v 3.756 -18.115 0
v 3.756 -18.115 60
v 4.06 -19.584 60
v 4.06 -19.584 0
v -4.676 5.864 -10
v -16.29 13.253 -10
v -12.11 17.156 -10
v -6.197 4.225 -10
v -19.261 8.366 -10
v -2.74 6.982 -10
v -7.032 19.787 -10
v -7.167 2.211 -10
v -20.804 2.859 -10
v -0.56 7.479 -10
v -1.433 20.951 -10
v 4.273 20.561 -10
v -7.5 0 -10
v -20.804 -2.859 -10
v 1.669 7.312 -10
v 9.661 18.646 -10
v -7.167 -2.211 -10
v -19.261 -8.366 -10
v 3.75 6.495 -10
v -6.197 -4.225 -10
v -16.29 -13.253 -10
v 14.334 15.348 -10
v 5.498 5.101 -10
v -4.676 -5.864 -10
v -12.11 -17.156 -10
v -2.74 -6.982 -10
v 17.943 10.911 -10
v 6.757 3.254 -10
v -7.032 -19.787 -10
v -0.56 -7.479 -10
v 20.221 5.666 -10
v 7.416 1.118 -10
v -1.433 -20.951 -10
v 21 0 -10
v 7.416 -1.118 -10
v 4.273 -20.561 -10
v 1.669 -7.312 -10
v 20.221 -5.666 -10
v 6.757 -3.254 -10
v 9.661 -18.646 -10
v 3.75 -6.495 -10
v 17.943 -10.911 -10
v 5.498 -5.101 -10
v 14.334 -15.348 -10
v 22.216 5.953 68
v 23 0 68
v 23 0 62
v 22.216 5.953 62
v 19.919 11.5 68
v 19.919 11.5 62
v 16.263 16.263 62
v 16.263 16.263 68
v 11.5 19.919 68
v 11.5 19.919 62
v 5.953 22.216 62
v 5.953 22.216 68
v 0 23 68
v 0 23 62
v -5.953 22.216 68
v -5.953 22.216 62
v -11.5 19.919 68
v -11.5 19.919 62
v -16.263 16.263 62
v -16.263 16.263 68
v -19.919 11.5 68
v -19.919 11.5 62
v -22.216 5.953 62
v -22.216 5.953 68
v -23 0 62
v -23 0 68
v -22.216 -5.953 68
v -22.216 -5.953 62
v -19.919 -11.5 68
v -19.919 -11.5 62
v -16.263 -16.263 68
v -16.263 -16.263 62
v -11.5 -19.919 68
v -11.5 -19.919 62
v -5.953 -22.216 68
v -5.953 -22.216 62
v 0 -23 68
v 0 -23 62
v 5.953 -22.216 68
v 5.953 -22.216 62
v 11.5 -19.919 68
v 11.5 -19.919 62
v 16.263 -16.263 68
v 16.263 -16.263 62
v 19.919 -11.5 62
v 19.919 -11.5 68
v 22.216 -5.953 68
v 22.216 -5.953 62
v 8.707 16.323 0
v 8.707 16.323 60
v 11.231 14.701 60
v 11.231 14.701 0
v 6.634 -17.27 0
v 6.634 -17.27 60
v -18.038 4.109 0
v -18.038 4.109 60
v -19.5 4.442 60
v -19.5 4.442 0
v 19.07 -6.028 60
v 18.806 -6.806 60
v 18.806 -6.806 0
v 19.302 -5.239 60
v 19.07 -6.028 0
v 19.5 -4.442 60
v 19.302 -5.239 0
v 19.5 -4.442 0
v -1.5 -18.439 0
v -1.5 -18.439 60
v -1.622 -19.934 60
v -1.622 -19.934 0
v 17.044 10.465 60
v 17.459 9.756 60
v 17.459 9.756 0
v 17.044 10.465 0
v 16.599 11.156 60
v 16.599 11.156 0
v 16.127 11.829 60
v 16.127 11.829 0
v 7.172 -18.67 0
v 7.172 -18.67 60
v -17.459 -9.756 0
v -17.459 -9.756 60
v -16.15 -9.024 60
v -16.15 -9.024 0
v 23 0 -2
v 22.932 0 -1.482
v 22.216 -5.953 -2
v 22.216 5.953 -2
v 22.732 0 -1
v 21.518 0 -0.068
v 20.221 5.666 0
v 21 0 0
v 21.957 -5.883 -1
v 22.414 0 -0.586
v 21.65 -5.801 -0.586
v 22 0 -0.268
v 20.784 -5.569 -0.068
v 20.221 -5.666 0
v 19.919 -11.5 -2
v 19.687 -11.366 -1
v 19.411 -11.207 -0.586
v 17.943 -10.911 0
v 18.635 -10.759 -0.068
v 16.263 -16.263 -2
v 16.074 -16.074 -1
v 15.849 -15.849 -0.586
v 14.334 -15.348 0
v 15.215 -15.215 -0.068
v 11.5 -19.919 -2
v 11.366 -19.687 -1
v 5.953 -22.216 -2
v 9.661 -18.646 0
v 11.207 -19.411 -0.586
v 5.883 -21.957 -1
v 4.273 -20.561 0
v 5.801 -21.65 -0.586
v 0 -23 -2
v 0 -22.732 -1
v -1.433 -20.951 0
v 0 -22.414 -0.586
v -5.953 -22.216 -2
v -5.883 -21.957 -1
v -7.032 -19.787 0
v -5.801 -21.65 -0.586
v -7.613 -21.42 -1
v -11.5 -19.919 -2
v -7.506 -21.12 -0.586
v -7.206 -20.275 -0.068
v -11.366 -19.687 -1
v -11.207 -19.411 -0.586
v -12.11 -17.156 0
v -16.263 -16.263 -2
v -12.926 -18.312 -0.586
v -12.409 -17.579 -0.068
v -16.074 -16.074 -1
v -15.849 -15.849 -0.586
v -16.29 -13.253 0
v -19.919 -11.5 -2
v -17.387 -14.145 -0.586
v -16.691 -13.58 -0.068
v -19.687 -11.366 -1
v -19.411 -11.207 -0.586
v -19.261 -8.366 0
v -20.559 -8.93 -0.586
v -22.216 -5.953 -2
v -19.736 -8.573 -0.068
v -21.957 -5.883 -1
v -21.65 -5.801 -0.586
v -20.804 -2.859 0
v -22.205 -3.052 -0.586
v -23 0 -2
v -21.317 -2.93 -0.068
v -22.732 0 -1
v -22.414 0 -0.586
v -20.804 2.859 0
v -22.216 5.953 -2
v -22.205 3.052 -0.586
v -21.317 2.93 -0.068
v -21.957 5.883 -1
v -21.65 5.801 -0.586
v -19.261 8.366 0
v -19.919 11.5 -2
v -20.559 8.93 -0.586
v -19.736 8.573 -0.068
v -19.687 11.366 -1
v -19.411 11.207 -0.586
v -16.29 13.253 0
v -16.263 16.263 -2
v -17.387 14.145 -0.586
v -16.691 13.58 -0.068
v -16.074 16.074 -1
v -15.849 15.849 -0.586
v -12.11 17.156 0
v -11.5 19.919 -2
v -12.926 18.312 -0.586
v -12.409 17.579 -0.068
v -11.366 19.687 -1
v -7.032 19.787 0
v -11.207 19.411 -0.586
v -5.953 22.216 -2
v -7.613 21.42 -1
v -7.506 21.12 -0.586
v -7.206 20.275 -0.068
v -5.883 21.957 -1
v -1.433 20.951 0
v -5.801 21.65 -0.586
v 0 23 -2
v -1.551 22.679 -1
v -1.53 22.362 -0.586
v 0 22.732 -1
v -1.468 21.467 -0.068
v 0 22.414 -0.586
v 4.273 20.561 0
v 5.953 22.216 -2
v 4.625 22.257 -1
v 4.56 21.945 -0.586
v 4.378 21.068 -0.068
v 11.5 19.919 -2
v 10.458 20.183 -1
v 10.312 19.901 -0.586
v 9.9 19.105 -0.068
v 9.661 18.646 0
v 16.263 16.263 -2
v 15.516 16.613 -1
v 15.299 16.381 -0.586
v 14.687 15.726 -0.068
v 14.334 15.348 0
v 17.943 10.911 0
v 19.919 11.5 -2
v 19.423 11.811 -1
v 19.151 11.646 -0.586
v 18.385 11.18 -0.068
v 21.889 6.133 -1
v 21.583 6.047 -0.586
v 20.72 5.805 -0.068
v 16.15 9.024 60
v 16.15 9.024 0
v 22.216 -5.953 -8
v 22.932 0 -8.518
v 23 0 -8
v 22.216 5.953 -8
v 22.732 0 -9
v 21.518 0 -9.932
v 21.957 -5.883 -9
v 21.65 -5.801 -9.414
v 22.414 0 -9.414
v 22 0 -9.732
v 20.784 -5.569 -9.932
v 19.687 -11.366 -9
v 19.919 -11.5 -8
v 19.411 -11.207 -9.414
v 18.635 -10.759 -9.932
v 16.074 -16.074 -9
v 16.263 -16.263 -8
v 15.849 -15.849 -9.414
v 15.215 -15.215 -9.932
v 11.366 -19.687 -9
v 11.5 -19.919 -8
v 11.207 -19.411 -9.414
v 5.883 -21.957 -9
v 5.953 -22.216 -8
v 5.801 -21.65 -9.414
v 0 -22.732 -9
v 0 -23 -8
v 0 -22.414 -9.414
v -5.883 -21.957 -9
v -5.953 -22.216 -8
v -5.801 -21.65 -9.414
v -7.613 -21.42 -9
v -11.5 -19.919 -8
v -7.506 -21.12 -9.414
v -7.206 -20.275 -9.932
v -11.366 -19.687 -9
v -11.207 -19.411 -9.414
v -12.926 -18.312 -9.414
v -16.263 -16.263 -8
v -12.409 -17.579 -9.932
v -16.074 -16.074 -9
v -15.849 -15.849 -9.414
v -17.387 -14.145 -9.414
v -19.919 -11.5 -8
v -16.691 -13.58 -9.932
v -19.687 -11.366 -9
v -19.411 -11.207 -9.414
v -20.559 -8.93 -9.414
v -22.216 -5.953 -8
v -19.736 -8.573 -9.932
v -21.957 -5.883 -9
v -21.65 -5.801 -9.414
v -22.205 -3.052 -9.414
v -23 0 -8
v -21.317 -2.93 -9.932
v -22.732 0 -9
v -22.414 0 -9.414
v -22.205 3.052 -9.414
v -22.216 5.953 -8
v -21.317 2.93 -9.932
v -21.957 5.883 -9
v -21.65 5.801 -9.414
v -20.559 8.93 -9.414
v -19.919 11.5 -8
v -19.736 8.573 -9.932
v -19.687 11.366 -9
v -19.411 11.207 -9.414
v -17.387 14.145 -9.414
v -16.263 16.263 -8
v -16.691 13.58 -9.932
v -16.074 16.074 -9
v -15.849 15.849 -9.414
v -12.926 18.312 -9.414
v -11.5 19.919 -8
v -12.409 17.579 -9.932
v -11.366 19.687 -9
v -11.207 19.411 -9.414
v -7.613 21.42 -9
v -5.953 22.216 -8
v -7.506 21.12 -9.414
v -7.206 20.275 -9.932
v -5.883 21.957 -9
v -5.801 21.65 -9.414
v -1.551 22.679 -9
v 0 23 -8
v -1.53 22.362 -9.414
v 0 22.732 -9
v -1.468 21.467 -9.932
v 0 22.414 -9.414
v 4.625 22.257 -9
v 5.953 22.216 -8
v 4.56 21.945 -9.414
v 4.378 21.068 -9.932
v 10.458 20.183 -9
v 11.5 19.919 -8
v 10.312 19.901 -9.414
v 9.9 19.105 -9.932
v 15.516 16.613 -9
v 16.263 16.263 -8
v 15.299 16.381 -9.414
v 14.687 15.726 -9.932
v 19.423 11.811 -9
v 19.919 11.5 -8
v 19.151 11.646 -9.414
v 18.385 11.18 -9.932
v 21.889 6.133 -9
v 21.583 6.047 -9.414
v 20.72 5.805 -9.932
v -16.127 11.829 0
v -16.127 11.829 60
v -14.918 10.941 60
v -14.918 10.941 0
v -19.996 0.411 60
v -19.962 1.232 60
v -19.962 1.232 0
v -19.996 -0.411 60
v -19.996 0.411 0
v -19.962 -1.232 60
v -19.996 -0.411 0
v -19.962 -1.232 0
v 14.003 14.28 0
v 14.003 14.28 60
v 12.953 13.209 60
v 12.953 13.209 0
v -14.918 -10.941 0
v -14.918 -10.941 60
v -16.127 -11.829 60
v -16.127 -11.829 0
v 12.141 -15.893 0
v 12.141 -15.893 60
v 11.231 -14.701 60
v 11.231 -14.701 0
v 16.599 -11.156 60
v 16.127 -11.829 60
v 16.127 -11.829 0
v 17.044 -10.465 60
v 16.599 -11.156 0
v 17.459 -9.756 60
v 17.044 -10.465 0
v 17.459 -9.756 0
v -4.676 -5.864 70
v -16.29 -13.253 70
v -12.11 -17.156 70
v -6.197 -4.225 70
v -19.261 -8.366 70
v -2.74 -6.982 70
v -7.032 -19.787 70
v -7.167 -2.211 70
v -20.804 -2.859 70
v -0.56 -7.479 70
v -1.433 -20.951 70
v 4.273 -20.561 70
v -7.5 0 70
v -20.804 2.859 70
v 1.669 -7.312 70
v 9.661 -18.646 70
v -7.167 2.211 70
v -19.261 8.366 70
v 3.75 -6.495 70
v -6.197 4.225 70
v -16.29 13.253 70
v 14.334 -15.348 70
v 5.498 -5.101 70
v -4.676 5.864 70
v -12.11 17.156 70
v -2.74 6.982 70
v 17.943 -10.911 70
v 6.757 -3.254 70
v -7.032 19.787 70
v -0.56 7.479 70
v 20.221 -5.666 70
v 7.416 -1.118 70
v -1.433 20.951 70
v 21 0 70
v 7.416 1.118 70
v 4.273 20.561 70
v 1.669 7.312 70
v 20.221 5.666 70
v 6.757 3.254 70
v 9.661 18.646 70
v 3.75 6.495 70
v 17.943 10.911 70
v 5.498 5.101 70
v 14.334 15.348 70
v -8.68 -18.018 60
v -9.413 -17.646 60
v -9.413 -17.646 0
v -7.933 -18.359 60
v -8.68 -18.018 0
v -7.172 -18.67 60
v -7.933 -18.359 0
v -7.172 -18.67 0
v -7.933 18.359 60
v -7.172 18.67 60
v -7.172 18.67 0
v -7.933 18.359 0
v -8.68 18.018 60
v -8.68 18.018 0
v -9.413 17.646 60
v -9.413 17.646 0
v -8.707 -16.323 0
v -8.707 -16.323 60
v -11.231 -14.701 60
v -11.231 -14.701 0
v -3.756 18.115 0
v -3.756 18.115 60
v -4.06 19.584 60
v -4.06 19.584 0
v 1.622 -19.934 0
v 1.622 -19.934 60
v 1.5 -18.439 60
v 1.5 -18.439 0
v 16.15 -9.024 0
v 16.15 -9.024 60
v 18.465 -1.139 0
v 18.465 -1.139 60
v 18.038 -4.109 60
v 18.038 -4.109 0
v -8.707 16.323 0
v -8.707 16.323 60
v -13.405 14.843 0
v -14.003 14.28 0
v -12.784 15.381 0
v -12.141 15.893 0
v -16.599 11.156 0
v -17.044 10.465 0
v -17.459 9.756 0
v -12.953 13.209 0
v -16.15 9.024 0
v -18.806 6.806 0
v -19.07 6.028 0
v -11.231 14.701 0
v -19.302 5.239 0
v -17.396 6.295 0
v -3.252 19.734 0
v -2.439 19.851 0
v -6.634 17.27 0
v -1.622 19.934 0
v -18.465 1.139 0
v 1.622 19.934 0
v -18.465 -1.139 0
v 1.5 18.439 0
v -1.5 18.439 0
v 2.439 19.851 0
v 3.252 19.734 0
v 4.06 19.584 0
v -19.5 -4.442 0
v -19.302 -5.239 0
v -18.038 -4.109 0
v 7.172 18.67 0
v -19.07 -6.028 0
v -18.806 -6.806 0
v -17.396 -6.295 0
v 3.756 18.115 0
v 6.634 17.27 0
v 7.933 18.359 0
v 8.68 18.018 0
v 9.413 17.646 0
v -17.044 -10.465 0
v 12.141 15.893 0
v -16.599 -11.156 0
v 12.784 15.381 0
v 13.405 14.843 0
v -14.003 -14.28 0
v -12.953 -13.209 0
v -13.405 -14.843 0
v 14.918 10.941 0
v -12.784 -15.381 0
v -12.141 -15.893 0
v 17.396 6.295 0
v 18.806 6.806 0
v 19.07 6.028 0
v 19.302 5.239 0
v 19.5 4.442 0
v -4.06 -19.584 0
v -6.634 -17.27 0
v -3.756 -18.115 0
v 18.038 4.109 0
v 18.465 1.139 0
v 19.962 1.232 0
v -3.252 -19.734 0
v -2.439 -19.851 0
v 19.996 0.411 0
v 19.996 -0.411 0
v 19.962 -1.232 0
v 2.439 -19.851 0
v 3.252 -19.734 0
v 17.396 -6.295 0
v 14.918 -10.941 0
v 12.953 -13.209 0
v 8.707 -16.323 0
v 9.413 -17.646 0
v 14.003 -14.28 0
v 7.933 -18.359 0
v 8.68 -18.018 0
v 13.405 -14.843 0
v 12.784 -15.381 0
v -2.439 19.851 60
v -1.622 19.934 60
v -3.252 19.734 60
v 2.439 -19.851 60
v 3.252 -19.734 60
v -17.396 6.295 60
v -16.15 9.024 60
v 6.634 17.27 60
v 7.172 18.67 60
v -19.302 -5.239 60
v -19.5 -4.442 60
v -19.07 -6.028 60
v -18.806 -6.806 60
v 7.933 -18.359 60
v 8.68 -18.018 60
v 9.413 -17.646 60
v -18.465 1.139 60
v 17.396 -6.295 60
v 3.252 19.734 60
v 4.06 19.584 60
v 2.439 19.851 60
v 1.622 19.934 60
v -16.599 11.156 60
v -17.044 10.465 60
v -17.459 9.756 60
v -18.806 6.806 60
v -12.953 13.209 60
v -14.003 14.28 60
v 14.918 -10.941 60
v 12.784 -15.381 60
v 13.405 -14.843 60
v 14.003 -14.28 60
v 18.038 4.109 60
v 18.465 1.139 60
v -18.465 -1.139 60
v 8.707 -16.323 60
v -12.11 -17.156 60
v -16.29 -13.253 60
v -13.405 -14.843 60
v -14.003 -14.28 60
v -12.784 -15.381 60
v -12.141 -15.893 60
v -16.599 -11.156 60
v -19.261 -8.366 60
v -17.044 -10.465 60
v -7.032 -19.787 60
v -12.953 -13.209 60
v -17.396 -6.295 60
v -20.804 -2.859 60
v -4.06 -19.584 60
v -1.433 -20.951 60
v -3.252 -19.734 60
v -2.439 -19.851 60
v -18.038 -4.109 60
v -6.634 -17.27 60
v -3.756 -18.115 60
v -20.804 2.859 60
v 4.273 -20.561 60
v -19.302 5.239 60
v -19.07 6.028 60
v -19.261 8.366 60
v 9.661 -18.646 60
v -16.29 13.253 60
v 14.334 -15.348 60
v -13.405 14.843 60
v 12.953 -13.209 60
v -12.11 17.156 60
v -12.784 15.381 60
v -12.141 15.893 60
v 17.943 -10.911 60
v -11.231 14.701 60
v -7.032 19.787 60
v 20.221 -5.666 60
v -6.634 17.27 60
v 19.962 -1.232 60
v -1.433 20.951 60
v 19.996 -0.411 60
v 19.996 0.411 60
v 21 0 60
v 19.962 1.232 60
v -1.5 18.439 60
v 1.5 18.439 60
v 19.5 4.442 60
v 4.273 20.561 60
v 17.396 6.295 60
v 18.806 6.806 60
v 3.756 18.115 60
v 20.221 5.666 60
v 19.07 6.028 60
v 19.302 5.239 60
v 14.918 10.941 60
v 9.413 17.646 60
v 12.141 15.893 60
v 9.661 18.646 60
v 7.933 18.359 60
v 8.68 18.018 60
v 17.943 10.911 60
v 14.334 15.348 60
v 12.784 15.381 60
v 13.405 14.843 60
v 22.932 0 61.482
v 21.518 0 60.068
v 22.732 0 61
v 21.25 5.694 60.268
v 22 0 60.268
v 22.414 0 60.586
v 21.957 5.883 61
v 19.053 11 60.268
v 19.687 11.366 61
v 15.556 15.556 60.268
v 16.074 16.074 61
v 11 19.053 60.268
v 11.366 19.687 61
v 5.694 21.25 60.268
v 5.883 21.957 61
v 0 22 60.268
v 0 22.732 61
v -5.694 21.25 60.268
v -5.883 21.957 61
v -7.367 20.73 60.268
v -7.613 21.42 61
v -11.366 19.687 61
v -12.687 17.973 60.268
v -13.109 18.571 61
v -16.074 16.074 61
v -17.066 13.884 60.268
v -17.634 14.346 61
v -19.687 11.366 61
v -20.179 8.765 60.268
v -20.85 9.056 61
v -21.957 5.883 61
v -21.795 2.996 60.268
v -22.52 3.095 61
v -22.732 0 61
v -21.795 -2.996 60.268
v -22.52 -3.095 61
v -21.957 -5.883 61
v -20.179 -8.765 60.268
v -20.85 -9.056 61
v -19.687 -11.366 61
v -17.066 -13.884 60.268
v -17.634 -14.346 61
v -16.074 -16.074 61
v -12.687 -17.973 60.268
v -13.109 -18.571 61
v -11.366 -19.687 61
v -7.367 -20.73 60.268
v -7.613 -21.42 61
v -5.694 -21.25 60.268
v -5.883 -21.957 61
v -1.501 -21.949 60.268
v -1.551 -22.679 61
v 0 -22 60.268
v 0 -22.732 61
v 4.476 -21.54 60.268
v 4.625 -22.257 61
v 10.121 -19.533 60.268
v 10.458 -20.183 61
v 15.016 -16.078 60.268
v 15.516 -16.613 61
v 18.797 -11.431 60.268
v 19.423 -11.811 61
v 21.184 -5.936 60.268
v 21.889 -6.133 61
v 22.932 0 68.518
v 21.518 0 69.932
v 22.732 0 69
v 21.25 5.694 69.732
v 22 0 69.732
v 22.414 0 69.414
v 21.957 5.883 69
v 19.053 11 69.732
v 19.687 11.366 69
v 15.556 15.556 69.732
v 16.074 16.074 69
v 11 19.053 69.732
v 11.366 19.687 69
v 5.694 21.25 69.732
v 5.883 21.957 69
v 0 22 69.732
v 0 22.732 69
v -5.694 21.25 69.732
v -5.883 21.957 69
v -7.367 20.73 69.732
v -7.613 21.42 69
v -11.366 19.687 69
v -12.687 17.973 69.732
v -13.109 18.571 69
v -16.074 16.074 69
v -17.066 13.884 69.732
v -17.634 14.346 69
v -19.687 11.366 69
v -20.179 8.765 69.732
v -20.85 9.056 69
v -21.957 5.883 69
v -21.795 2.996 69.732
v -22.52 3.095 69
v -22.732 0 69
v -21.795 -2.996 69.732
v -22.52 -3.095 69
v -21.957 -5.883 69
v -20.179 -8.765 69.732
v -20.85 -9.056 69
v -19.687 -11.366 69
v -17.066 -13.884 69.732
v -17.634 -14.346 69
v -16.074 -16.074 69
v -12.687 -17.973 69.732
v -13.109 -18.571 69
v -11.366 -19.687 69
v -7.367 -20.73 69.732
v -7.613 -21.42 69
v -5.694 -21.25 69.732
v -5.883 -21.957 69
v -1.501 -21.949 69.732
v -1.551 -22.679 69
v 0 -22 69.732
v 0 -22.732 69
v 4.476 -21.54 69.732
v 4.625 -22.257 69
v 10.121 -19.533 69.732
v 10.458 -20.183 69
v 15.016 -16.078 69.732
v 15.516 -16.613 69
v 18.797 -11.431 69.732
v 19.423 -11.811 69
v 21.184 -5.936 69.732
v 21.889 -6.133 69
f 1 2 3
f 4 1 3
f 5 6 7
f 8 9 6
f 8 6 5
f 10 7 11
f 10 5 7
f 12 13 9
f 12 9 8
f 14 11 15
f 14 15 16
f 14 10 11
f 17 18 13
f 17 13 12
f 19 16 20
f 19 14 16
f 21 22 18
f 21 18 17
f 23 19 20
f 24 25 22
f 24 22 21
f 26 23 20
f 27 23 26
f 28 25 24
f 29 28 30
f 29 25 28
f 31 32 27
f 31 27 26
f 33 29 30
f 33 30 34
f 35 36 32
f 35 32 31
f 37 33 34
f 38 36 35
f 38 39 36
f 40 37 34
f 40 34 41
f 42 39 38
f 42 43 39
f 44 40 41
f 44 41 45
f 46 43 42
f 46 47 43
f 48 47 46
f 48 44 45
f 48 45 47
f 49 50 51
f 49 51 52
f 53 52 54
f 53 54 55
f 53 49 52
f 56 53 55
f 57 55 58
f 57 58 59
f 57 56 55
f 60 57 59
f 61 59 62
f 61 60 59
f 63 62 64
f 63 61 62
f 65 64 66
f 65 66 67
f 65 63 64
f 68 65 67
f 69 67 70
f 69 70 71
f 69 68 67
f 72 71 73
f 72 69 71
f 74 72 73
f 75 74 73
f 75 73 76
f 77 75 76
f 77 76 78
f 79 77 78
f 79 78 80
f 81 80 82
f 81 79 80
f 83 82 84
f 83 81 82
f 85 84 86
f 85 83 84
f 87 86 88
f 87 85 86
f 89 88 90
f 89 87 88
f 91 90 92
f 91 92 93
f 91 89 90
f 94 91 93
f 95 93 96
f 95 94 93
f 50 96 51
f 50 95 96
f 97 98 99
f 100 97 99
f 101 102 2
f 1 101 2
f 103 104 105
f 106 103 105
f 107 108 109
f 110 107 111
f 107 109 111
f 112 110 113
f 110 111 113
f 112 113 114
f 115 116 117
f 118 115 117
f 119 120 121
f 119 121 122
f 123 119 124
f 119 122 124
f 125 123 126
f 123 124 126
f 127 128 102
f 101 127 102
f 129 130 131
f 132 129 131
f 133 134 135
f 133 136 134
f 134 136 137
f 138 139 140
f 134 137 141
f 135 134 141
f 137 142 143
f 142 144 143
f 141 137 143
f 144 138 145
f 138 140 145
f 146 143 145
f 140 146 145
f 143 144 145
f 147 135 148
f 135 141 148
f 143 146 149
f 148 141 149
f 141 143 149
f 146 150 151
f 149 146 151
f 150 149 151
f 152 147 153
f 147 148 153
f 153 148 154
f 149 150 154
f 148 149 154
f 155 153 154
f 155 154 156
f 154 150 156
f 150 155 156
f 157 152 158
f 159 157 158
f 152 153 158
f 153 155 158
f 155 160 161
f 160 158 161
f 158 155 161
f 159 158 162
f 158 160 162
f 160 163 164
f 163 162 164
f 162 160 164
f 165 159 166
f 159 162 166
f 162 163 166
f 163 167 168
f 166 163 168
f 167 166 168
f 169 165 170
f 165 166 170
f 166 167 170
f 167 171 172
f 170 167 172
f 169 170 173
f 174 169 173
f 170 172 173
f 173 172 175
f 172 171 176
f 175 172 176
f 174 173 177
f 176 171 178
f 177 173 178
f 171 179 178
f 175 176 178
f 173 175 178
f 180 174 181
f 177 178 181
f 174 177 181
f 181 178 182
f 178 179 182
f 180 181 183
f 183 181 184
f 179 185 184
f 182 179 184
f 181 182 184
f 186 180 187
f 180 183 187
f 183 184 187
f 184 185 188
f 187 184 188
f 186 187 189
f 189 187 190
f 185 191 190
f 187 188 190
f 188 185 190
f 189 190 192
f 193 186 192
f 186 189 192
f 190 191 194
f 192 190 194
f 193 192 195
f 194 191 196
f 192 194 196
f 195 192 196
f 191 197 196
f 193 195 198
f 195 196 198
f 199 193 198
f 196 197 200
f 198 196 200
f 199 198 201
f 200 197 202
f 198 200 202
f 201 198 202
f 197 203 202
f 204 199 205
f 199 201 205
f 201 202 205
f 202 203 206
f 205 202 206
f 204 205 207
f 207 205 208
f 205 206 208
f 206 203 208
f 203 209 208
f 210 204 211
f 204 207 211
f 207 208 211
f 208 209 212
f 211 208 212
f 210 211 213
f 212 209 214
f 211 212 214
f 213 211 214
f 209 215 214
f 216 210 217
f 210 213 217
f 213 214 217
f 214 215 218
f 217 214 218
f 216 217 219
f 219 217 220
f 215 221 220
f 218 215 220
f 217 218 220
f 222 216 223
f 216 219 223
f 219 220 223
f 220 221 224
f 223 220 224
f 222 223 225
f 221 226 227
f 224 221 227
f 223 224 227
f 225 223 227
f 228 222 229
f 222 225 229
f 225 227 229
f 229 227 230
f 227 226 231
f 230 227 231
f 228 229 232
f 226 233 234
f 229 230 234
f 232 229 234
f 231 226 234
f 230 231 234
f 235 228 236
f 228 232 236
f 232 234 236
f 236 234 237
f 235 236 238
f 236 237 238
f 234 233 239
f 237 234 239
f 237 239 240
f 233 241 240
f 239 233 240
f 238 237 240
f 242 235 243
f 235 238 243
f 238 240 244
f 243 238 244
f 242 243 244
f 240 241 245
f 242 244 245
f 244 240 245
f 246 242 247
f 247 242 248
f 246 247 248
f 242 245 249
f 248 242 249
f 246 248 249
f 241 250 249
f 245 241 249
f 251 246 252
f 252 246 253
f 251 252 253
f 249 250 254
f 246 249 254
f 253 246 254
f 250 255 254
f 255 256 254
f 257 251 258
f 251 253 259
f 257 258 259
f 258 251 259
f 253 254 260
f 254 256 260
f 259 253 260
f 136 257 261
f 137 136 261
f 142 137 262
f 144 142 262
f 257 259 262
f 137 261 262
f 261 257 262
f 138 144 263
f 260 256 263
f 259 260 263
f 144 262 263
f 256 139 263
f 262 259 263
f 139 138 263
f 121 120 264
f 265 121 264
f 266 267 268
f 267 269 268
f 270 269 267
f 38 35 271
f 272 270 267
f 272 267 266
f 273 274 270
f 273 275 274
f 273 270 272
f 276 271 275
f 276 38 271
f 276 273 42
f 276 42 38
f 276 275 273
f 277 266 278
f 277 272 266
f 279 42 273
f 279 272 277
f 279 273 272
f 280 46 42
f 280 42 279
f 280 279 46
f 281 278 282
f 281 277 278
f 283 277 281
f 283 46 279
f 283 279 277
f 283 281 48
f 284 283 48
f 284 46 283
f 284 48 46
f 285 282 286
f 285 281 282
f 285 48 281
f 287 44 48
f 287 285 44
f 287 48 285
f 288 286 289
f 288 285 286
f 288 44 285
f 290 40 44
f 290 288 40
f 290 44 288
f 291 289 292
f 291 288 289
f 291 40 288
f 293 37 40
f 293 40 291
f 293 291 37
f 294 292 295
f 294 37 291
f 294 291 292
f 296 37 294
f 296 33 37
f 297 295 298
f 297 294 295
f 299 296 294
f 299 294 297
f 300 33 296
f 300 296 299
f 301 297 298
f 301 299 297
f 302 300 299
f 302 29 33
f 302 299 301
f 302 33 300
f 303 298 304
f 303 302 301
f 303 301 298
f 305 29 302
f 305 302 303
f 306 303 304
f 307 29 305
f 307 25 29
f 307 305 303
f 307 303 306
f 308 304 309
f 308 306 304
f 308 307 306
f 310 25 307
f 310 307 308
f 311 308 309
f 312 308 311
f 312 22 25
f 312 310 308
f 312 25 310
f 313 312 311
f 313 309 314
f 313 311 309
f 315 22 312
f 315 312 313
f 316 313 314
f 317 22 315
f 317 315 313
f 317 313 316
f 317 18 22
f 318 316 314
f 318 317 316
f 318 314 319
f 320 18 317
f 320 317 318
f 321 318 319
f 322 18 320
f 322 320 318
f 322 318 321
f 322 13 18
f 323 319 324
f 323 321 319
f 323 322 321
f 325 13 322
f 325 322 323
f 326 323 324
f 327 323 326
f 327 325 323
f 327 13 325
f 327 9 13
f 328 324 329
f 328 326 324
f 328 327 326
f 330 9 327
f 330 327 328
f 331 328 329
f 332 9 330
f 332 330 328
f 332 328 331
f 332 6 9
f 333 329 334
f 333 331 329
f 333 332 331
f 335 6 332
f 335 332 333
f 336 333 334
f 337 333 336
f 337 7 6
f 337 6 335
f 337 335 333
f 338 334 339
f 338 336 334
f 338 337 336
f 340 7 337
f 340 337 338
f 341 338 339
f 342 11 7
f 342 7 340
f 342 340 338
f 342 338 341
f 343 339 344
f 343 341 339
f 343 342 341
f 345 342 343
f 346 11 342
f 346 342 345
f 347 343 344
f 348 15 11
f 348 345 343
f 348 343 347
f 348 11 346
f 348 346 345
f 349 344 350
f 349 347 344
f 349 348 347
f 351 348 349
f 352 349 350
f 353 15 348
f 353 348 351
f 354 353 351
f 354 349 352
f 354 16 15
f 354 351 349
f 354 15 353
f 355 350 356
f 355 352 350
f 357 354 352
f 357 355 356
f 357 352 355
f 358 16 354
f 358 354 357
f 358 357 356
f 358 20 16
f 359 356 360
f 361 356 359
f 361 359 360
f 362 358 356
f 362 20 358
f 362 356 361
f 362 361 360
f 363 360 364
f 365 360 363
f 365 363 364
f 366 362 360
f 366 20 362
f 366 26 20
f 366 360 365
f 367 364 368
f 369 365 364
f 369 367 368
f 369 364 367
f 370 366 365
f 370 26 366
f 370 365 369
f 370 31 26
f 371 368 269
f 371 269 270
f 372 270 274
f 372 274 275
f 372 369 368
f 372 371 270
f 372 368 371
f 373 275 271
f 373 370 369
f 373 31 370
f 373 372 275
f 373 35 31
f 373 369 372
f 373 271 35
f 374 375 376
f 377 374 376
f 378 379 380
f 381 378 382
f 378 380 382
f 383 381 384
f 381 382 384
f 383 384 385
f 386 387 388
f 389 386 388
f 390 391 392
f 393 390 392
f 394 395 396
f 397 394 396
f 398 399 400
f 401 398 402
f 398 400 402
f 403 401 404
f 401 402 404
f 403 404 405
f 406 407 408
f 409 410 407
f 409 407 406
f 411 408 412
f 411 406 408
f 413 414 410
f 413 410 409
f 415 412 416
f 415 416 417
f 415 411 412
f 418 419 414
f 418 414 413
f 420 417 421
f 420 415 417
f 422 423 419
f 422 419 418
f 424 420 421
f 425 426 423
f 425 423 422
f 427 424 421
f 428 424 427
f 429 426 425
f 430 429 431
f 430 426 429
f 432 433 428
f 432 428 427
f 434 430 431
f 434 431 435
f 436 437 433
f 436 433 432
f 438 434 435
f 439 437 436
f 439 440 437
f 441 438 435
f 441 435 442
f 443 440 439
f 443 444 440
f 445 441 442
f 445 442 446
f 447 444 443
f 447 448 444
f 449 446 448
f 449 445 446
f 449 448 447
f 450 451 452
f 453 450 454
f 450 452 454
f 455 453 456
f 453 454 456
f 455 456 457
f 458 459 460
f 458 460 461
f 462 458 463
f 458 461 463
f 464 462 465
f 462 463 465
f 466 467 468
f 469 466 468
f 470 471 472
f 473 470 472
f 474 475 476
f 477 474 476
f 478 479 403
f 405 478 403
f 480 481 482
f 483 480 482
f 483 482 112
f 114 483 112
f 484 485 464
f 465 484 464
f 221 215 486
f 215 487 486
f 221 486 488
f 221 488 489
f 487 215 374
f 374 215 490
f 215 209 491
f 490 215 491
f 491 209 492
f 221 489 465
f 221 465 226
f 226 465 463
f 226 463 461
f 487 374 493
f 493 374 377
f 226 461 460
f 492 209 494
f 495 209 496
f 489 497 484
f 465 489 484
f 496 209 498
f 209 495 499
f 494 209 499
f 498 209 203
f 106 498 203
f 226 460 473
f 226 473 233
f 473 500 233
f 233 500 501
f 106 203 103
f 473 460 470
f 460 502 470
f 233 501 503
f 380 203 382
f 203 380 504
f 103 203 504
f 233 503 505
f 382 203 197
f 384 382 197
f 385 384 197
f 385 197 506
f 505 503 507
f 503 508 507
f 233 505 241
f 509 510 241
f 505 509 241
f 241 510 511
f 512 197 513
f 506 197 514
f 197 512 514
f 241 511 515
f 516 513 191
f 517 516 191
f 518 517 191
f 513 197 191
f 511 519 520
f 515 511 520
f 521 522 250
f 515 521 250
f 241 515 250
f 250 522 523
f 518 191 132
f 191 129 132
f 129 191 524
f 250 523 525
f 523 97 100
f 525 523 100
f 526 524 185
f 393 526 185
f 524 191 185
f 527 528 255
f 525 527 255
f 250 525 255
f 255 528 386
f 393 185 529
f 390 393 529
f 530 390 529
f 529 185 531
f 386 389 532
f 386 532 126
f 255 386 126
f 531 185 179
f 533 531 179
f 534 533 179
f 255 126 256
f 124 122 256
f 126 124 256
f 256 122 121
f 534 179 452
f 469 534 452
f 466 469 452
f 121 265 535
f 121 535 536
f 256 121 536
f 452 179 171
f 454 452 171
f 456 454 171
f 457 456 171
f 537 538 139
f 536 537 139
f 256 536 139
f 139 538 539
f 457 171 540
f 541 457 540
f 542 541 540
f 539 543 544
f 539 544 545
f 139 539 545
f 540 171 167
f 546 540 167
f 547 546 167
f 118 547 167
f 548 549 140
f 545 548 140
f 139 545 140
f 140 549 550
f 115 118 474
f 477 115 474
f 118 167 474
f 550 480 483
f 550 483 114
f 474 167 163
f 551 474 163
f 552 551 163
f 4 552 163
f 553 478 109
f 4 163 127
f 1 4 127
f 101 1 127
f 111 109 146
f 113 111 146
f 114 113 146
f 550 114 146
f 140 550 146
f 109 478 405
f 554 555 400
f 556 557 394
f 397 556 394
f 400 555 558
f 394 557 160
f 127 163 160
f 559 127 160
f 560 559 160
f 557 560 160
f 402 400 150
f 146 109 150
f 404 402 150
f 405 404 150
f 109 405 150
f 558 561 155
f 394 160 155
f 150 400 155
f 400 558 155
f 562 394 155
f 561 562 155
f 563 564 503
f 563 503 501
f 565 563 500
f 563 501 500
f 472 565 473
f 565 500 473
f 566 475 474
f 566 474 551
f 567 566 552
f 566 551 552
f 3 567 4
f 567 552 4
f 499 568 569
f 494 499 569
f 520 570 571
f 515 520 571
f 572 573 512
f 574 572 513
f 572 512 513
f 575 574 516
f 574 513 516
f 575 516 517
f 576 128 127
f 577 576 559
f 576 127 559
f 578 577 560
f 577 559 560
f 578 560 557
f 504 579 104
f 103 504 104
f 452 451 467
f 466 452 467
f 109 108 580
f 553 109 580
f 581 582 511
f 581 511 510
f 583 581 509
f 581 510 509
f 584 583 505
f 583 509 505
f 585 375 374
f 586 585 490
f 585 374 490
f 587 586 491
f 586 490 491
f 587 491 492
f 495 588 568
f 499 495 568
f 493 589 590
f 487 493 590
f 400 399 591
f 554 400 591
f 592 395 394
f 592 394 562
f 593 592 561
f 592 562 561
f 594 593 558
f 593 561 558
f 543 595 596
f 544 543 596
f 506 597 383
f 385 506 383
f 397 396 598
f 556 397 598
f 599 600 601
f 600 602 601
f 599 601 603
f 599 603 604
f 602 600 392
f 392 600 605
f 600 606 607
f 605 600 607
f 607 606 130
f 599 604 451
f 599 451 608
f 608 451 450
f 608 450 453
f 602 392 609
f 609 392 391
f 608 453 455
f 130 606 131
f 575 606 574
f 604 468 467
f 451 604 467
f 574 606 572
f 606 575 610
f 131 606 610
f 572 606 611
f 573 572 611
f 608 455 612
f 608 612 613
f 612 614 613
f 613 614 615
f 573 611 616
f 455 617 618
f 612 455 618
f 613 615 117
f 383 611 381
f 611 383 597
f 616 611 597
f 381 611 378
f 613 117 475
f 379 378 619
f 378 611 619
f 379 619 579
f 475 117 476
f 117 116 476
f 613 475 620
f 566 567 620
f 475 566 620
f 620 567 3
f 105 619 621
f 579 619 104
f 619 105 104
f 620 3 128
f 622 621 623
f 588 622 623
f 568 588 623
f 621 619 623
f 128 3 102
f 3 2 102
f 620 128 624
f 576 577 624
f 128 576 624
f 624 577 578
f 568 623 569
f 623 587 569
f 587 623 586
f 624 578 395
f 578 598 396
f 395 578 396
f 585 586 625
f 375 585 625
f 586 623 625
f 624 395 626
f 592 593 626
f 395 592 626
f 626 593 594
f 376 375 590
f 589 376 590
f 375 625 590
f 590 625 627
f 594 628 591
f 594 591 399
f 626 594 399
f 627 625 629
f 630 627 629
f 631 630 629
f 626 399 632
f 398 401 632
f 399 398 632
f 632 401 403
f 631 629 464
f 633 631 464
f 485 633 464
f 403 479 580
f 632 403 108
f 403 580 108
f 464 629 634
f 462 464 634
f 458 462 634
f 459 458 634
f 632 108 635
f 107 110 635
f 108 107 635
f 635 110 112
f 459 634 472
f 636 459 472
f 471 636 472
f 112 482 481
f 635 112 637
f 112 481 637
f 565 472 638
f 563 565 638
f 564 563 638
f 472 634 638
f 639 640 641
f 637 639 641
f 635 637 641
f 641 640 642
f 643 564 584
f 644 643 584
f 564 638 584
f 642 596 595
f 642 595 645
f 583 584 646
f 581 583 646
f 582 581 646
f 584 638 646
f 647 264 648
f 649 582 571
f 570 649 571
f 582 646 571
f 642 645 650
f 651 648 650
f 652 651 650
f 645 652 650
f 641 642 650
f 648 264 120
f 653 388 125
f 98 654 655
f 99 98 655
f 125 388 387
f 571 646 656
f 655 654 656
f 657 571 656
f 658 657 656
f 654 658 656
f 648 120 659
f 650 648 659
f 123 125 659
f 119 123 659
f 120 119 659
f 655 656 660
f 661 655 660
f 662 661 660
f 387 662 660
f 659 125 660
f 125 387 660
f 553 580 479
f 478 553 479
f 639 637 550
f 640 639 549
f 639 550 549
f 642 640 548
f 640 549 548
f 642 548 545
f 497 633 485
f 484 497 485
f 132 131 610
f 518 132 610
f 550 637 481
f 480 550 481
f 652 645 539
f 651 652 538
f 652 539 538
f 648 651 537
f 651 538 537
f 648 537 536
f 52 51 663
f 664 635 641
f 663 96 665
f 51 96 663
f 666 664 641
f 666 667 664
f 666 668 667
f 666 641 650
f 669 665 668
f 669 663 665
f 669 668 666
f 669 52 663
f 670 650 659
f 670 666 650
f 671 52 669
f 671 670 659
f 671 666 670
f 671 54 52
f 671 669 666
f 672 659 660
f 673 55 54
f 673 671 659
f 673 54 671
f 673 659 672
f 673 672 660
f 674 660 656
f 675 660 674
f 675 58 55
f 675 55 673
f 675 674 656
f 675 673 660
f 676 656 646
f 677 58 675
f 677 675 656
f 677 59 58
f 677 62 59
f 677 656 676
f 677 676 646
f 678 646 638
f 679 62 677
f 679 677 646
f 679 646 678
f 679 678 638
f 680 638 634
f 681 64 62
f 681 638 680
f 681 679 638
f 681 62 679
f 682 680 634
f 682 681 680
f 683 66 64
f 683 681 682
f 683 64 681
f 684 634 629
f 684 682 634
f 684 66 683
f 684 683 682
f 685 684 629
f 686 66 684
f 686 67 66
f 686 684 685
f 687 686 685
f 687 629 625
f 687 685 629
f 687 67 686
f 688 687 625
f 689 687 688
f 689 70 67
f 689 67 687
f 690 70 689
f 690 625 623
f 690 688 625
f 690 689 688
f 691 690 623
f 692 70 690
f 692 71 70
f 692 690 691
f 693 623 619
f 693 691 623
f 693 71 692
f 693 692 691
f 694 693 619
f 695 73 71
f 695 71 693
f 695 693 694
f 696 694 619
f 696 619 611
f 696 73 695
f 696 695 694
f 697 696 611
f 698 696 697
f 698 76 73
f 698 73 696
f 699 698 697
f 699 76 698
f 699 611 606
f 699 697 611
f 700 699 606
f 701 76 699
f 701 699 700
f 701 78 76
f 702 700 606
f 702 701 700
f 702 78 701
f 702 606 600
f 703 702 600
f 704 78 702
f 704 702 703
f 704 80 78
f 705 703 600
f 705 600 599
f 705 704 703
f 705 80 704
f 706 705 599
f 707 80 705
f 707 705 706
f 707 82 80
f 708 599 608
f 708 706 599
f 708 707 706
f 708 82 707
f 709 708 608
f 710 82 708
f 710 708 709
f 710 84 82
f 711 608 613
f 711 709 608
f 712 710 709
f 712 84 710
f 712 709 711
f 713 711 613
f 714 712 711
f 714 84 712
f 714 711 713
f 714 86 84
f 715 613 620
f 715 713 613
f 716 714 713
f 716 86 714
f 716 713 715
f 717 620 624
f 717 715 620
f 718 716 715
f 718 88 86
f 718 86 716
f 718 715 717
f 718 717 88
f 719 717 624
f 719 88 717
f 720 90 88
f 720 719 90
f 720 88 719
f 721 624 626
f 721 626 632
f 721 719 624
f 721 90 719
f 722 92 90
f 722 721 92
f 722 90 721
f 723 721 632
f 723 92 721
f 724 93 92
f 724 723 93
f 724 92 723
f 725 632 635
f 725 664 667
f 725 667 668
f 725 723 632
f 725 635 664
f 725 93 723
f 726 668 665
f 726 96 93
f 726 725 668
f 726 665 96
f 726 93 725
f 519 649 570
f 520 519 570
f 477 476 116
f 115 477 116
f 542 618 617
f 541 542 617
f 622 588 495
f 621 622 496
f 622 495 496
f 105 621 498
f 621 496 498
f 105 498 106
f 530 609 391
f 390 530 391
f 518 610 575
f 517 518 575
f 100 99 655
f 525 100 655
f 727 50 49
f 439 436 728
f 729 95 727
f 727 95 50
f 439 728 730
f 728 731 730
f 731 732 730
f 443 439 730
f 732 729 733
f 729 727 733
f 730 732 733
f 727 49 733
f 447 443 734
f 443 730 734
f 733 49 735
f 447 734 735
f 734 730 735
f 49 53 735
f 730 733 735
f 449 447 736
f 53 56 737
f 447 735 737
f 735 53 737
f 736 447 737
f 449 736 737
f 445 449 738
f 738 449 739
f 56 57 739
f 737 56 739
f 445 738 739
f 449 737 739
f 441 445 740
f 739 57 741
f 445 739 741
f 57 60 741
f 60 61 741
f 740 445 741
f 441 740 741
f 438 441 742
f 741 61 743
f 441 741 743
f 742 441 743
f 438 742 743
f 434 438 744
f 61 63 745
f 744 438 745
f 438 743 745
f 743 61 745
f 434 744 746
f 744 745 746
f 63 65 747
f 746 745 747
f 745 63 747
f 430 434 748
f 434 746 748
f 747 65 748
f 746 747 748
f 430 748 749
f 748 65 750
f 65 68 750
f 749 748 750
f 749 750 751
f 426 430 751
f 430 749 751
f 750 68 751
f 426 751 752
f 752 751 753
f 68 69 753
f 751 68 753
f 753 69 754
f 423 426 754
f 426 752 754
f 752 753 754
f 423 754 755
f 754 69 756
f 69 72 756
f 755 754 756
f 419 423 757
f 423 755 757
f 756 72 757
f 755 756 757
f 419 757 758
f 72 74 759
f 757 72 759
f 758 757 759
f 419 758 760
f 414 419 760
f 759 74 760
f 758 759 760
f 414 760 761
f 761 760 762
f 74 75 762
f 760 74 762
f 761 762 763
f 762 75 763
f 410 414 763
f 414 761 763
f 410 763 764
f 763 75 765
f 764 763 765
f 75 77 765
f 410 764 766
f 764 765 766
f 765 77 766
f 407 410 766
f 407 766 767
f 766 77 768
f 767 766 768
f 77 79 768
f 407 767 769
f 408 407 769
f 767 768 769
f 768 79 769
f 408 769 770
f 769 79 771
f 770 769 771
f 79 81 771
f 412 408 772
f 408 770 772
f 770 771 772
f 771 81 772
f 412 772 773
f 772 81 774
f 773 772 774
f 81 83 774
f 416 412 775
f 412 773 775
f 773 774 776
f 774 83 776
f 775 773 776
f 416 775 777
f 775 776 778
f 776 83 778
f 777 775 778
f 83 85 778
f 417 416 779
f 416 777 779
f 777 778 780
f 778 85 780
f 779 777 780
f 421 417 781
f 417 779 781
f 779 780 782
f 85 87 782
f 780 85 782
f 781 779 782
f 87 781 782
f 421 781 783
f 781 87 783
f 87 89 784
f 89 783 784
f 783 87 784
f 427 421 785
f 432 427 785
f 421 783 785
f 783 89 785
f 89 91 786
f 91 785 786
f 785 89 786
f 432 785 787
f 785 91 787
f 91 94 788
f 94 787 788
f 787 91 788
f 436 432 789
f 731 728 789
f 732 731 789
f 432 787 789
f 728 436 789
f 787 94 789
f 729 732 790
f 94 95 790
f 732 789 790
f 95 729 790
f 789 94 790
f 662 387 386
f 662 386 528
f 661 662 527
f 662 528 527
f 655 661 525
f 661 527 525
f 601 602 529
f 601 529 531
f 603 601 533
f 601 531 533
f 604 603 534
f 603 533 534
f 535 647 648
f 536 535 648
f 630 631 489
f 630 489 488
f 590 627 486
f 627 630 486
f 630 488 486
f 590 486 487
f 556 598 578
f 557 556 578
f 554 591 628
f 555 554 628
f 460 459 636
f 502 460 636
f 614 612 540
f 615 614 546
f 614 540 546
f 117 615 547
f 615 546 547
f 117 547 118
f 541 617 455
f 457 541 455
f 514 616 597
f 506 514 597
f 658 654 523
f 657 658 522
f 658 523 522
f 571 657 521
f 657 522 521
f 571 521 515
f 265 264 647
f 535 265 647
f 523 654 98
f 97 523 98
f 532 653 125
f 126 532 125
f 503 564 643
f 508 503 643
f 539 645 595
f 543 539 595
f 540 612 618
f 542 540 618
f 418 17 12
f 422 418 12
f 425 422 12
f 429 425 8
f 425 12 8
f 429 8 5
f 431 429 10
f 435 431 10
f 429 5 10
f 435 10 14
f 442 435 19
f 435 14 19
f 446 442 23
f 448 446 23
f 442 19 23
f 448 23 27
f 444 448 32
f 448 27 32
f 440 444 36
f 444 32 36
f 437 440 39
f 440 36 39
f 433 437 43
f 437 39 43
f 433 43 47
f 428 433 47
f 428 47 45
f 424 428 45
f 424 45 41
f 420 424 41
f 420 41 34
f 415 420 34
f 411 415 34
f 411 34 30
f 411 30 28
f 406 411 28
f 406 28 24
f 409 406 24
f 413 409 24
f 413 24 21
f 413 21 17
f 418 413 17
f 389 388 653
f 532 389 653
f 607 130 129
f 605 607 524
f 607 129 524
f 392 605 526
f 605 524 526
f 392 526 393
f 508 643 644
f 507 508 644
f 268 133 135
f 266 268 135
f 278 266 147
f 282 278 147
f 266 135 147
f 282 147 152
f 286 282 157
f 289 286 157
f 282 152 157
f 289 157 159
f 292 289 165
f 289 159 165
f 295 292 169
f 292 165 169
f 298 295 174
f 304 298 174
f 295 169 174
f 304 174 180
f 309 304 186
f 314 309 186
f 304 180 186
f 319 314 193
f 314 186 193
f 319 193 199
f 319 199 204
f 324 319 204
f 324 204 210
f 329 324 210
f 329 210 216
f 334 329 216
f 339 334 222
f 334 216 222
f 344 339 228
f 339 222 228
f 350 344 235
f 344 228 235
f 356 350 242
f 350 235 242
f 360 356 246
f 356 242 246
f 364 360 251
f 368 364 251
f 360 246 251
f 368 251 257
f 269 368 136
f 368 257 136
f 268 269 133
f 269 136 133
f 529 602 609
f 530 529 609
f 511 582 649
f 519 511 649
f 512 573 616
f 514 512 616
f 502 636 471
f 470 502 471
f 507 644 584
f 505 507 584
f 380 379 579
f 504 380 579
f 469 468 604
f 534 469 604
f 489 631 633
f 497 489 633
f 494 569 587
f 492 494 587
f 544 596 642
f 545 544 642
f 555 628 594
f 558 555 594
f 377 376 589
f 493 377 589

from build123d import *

# Parameters (mm, degrees)
SKETCH1_R           = 20
BOSS_EXTRUDE1_DEPTH = 70
CUT_EXTRUDE1_DEPTH  = 76.498344353
CIRPATTERN1_COUNT   = 22
SKETCH3_R           = 23
BOSS_EXTRUDE2_DEPTH = 10
SKETCH4_R           = 23
BOSS_EXTRUDE3_DEPTH = 10
SKETCH5_R           = 7.5
CUT_EXTRUDE2_DEPTH  = 87.35971283
FILLET1_R           = 2


with BuildPart() as part:
    # Sketch1 → Boss-Extrude1 (new body)
    with BuildSketch(Plane.XY):
        Circle(SKETCH1_R)
    extrude(amount=BOSS_EXTRUDE1_DEPTH)

    # Sketch2 → Cut-Extrude1 (cut, through all)
    with BuildSketch(Plane.XY.offset(70)):
        with BuildLine():
            Line((-1.5, 18.439088915), (1.5, 18.439088915))
            Line((1.5, 18.439088915), (1.621621622, 19.934150178))
            ThreePointArc((1.621621622, 19.934150178), (0, 20), (-1.621621622, 19.934150178))
            Line((-1.621621622, 19.934150178), (-1.5, 18.439088915))
        make_face()
    cut_extrude1 = extrude(amount=-CUT_EXTRUDE1_DEPTH, mode=Mode.SUBTRACT)

    # CirPattern1: Cut-Extrude1 ×22 about axis
    cirpattern1_axis = Axis((0, 0, 0), (0, 0, 1))
    for i in range(1, CIRPATTERN1_COUNT):
        add(cut_extrude1.rotate(cirpattern1_axis, i * 360 / CIRPATTERN1_COUNT), mode=Mode.SUBTRACT)

    # Sketch3 → Boss-Extrude2 (add)
    with BuildSketch(Plane.XY.offset(70)):
        Circle(SKETCH3_R)
    extrude(amount=-BOSS_EXTRUDE2_DEPTH)

    # Sketch4 → Boss-Extrude3 (add)
    with BuildSketch(Plane(origin=(0, 0, 0), x_dir=(-1, 0, 0), z_dir=(0, 0, -1))):
        with Locations(Location((0, 0, 0), (0, 0, 180))):
            Circle(SKETCH4_R)
    extrude(amount=BOSS_EXTRUDE3_DEPTH)

    # Sketch5 → Cut-Extrude2 (cut, through all)
    with BuildSketch(Plane(origin=(0, 0, -10), x_dir=(-1, 0, 0), z_dir=(0, 0, -1))):
        Circle(SKETCH5_R)
    extrude(amount=-CUT_EXTRUDE2_DEPTH, mode=Mode.SUBTRACT)

    # Fillet1
    fillet1_edges = [part.edges().sort_by_distance(p)[0] for p in [
        (-23, 0, 70),
        (-23, 0, 60),
        (-23, 0, 0),
        (-23, 0, -10),
    ]]
    fillet(fillet1_edges, radius=FILLET1_R)


solid = part.part
